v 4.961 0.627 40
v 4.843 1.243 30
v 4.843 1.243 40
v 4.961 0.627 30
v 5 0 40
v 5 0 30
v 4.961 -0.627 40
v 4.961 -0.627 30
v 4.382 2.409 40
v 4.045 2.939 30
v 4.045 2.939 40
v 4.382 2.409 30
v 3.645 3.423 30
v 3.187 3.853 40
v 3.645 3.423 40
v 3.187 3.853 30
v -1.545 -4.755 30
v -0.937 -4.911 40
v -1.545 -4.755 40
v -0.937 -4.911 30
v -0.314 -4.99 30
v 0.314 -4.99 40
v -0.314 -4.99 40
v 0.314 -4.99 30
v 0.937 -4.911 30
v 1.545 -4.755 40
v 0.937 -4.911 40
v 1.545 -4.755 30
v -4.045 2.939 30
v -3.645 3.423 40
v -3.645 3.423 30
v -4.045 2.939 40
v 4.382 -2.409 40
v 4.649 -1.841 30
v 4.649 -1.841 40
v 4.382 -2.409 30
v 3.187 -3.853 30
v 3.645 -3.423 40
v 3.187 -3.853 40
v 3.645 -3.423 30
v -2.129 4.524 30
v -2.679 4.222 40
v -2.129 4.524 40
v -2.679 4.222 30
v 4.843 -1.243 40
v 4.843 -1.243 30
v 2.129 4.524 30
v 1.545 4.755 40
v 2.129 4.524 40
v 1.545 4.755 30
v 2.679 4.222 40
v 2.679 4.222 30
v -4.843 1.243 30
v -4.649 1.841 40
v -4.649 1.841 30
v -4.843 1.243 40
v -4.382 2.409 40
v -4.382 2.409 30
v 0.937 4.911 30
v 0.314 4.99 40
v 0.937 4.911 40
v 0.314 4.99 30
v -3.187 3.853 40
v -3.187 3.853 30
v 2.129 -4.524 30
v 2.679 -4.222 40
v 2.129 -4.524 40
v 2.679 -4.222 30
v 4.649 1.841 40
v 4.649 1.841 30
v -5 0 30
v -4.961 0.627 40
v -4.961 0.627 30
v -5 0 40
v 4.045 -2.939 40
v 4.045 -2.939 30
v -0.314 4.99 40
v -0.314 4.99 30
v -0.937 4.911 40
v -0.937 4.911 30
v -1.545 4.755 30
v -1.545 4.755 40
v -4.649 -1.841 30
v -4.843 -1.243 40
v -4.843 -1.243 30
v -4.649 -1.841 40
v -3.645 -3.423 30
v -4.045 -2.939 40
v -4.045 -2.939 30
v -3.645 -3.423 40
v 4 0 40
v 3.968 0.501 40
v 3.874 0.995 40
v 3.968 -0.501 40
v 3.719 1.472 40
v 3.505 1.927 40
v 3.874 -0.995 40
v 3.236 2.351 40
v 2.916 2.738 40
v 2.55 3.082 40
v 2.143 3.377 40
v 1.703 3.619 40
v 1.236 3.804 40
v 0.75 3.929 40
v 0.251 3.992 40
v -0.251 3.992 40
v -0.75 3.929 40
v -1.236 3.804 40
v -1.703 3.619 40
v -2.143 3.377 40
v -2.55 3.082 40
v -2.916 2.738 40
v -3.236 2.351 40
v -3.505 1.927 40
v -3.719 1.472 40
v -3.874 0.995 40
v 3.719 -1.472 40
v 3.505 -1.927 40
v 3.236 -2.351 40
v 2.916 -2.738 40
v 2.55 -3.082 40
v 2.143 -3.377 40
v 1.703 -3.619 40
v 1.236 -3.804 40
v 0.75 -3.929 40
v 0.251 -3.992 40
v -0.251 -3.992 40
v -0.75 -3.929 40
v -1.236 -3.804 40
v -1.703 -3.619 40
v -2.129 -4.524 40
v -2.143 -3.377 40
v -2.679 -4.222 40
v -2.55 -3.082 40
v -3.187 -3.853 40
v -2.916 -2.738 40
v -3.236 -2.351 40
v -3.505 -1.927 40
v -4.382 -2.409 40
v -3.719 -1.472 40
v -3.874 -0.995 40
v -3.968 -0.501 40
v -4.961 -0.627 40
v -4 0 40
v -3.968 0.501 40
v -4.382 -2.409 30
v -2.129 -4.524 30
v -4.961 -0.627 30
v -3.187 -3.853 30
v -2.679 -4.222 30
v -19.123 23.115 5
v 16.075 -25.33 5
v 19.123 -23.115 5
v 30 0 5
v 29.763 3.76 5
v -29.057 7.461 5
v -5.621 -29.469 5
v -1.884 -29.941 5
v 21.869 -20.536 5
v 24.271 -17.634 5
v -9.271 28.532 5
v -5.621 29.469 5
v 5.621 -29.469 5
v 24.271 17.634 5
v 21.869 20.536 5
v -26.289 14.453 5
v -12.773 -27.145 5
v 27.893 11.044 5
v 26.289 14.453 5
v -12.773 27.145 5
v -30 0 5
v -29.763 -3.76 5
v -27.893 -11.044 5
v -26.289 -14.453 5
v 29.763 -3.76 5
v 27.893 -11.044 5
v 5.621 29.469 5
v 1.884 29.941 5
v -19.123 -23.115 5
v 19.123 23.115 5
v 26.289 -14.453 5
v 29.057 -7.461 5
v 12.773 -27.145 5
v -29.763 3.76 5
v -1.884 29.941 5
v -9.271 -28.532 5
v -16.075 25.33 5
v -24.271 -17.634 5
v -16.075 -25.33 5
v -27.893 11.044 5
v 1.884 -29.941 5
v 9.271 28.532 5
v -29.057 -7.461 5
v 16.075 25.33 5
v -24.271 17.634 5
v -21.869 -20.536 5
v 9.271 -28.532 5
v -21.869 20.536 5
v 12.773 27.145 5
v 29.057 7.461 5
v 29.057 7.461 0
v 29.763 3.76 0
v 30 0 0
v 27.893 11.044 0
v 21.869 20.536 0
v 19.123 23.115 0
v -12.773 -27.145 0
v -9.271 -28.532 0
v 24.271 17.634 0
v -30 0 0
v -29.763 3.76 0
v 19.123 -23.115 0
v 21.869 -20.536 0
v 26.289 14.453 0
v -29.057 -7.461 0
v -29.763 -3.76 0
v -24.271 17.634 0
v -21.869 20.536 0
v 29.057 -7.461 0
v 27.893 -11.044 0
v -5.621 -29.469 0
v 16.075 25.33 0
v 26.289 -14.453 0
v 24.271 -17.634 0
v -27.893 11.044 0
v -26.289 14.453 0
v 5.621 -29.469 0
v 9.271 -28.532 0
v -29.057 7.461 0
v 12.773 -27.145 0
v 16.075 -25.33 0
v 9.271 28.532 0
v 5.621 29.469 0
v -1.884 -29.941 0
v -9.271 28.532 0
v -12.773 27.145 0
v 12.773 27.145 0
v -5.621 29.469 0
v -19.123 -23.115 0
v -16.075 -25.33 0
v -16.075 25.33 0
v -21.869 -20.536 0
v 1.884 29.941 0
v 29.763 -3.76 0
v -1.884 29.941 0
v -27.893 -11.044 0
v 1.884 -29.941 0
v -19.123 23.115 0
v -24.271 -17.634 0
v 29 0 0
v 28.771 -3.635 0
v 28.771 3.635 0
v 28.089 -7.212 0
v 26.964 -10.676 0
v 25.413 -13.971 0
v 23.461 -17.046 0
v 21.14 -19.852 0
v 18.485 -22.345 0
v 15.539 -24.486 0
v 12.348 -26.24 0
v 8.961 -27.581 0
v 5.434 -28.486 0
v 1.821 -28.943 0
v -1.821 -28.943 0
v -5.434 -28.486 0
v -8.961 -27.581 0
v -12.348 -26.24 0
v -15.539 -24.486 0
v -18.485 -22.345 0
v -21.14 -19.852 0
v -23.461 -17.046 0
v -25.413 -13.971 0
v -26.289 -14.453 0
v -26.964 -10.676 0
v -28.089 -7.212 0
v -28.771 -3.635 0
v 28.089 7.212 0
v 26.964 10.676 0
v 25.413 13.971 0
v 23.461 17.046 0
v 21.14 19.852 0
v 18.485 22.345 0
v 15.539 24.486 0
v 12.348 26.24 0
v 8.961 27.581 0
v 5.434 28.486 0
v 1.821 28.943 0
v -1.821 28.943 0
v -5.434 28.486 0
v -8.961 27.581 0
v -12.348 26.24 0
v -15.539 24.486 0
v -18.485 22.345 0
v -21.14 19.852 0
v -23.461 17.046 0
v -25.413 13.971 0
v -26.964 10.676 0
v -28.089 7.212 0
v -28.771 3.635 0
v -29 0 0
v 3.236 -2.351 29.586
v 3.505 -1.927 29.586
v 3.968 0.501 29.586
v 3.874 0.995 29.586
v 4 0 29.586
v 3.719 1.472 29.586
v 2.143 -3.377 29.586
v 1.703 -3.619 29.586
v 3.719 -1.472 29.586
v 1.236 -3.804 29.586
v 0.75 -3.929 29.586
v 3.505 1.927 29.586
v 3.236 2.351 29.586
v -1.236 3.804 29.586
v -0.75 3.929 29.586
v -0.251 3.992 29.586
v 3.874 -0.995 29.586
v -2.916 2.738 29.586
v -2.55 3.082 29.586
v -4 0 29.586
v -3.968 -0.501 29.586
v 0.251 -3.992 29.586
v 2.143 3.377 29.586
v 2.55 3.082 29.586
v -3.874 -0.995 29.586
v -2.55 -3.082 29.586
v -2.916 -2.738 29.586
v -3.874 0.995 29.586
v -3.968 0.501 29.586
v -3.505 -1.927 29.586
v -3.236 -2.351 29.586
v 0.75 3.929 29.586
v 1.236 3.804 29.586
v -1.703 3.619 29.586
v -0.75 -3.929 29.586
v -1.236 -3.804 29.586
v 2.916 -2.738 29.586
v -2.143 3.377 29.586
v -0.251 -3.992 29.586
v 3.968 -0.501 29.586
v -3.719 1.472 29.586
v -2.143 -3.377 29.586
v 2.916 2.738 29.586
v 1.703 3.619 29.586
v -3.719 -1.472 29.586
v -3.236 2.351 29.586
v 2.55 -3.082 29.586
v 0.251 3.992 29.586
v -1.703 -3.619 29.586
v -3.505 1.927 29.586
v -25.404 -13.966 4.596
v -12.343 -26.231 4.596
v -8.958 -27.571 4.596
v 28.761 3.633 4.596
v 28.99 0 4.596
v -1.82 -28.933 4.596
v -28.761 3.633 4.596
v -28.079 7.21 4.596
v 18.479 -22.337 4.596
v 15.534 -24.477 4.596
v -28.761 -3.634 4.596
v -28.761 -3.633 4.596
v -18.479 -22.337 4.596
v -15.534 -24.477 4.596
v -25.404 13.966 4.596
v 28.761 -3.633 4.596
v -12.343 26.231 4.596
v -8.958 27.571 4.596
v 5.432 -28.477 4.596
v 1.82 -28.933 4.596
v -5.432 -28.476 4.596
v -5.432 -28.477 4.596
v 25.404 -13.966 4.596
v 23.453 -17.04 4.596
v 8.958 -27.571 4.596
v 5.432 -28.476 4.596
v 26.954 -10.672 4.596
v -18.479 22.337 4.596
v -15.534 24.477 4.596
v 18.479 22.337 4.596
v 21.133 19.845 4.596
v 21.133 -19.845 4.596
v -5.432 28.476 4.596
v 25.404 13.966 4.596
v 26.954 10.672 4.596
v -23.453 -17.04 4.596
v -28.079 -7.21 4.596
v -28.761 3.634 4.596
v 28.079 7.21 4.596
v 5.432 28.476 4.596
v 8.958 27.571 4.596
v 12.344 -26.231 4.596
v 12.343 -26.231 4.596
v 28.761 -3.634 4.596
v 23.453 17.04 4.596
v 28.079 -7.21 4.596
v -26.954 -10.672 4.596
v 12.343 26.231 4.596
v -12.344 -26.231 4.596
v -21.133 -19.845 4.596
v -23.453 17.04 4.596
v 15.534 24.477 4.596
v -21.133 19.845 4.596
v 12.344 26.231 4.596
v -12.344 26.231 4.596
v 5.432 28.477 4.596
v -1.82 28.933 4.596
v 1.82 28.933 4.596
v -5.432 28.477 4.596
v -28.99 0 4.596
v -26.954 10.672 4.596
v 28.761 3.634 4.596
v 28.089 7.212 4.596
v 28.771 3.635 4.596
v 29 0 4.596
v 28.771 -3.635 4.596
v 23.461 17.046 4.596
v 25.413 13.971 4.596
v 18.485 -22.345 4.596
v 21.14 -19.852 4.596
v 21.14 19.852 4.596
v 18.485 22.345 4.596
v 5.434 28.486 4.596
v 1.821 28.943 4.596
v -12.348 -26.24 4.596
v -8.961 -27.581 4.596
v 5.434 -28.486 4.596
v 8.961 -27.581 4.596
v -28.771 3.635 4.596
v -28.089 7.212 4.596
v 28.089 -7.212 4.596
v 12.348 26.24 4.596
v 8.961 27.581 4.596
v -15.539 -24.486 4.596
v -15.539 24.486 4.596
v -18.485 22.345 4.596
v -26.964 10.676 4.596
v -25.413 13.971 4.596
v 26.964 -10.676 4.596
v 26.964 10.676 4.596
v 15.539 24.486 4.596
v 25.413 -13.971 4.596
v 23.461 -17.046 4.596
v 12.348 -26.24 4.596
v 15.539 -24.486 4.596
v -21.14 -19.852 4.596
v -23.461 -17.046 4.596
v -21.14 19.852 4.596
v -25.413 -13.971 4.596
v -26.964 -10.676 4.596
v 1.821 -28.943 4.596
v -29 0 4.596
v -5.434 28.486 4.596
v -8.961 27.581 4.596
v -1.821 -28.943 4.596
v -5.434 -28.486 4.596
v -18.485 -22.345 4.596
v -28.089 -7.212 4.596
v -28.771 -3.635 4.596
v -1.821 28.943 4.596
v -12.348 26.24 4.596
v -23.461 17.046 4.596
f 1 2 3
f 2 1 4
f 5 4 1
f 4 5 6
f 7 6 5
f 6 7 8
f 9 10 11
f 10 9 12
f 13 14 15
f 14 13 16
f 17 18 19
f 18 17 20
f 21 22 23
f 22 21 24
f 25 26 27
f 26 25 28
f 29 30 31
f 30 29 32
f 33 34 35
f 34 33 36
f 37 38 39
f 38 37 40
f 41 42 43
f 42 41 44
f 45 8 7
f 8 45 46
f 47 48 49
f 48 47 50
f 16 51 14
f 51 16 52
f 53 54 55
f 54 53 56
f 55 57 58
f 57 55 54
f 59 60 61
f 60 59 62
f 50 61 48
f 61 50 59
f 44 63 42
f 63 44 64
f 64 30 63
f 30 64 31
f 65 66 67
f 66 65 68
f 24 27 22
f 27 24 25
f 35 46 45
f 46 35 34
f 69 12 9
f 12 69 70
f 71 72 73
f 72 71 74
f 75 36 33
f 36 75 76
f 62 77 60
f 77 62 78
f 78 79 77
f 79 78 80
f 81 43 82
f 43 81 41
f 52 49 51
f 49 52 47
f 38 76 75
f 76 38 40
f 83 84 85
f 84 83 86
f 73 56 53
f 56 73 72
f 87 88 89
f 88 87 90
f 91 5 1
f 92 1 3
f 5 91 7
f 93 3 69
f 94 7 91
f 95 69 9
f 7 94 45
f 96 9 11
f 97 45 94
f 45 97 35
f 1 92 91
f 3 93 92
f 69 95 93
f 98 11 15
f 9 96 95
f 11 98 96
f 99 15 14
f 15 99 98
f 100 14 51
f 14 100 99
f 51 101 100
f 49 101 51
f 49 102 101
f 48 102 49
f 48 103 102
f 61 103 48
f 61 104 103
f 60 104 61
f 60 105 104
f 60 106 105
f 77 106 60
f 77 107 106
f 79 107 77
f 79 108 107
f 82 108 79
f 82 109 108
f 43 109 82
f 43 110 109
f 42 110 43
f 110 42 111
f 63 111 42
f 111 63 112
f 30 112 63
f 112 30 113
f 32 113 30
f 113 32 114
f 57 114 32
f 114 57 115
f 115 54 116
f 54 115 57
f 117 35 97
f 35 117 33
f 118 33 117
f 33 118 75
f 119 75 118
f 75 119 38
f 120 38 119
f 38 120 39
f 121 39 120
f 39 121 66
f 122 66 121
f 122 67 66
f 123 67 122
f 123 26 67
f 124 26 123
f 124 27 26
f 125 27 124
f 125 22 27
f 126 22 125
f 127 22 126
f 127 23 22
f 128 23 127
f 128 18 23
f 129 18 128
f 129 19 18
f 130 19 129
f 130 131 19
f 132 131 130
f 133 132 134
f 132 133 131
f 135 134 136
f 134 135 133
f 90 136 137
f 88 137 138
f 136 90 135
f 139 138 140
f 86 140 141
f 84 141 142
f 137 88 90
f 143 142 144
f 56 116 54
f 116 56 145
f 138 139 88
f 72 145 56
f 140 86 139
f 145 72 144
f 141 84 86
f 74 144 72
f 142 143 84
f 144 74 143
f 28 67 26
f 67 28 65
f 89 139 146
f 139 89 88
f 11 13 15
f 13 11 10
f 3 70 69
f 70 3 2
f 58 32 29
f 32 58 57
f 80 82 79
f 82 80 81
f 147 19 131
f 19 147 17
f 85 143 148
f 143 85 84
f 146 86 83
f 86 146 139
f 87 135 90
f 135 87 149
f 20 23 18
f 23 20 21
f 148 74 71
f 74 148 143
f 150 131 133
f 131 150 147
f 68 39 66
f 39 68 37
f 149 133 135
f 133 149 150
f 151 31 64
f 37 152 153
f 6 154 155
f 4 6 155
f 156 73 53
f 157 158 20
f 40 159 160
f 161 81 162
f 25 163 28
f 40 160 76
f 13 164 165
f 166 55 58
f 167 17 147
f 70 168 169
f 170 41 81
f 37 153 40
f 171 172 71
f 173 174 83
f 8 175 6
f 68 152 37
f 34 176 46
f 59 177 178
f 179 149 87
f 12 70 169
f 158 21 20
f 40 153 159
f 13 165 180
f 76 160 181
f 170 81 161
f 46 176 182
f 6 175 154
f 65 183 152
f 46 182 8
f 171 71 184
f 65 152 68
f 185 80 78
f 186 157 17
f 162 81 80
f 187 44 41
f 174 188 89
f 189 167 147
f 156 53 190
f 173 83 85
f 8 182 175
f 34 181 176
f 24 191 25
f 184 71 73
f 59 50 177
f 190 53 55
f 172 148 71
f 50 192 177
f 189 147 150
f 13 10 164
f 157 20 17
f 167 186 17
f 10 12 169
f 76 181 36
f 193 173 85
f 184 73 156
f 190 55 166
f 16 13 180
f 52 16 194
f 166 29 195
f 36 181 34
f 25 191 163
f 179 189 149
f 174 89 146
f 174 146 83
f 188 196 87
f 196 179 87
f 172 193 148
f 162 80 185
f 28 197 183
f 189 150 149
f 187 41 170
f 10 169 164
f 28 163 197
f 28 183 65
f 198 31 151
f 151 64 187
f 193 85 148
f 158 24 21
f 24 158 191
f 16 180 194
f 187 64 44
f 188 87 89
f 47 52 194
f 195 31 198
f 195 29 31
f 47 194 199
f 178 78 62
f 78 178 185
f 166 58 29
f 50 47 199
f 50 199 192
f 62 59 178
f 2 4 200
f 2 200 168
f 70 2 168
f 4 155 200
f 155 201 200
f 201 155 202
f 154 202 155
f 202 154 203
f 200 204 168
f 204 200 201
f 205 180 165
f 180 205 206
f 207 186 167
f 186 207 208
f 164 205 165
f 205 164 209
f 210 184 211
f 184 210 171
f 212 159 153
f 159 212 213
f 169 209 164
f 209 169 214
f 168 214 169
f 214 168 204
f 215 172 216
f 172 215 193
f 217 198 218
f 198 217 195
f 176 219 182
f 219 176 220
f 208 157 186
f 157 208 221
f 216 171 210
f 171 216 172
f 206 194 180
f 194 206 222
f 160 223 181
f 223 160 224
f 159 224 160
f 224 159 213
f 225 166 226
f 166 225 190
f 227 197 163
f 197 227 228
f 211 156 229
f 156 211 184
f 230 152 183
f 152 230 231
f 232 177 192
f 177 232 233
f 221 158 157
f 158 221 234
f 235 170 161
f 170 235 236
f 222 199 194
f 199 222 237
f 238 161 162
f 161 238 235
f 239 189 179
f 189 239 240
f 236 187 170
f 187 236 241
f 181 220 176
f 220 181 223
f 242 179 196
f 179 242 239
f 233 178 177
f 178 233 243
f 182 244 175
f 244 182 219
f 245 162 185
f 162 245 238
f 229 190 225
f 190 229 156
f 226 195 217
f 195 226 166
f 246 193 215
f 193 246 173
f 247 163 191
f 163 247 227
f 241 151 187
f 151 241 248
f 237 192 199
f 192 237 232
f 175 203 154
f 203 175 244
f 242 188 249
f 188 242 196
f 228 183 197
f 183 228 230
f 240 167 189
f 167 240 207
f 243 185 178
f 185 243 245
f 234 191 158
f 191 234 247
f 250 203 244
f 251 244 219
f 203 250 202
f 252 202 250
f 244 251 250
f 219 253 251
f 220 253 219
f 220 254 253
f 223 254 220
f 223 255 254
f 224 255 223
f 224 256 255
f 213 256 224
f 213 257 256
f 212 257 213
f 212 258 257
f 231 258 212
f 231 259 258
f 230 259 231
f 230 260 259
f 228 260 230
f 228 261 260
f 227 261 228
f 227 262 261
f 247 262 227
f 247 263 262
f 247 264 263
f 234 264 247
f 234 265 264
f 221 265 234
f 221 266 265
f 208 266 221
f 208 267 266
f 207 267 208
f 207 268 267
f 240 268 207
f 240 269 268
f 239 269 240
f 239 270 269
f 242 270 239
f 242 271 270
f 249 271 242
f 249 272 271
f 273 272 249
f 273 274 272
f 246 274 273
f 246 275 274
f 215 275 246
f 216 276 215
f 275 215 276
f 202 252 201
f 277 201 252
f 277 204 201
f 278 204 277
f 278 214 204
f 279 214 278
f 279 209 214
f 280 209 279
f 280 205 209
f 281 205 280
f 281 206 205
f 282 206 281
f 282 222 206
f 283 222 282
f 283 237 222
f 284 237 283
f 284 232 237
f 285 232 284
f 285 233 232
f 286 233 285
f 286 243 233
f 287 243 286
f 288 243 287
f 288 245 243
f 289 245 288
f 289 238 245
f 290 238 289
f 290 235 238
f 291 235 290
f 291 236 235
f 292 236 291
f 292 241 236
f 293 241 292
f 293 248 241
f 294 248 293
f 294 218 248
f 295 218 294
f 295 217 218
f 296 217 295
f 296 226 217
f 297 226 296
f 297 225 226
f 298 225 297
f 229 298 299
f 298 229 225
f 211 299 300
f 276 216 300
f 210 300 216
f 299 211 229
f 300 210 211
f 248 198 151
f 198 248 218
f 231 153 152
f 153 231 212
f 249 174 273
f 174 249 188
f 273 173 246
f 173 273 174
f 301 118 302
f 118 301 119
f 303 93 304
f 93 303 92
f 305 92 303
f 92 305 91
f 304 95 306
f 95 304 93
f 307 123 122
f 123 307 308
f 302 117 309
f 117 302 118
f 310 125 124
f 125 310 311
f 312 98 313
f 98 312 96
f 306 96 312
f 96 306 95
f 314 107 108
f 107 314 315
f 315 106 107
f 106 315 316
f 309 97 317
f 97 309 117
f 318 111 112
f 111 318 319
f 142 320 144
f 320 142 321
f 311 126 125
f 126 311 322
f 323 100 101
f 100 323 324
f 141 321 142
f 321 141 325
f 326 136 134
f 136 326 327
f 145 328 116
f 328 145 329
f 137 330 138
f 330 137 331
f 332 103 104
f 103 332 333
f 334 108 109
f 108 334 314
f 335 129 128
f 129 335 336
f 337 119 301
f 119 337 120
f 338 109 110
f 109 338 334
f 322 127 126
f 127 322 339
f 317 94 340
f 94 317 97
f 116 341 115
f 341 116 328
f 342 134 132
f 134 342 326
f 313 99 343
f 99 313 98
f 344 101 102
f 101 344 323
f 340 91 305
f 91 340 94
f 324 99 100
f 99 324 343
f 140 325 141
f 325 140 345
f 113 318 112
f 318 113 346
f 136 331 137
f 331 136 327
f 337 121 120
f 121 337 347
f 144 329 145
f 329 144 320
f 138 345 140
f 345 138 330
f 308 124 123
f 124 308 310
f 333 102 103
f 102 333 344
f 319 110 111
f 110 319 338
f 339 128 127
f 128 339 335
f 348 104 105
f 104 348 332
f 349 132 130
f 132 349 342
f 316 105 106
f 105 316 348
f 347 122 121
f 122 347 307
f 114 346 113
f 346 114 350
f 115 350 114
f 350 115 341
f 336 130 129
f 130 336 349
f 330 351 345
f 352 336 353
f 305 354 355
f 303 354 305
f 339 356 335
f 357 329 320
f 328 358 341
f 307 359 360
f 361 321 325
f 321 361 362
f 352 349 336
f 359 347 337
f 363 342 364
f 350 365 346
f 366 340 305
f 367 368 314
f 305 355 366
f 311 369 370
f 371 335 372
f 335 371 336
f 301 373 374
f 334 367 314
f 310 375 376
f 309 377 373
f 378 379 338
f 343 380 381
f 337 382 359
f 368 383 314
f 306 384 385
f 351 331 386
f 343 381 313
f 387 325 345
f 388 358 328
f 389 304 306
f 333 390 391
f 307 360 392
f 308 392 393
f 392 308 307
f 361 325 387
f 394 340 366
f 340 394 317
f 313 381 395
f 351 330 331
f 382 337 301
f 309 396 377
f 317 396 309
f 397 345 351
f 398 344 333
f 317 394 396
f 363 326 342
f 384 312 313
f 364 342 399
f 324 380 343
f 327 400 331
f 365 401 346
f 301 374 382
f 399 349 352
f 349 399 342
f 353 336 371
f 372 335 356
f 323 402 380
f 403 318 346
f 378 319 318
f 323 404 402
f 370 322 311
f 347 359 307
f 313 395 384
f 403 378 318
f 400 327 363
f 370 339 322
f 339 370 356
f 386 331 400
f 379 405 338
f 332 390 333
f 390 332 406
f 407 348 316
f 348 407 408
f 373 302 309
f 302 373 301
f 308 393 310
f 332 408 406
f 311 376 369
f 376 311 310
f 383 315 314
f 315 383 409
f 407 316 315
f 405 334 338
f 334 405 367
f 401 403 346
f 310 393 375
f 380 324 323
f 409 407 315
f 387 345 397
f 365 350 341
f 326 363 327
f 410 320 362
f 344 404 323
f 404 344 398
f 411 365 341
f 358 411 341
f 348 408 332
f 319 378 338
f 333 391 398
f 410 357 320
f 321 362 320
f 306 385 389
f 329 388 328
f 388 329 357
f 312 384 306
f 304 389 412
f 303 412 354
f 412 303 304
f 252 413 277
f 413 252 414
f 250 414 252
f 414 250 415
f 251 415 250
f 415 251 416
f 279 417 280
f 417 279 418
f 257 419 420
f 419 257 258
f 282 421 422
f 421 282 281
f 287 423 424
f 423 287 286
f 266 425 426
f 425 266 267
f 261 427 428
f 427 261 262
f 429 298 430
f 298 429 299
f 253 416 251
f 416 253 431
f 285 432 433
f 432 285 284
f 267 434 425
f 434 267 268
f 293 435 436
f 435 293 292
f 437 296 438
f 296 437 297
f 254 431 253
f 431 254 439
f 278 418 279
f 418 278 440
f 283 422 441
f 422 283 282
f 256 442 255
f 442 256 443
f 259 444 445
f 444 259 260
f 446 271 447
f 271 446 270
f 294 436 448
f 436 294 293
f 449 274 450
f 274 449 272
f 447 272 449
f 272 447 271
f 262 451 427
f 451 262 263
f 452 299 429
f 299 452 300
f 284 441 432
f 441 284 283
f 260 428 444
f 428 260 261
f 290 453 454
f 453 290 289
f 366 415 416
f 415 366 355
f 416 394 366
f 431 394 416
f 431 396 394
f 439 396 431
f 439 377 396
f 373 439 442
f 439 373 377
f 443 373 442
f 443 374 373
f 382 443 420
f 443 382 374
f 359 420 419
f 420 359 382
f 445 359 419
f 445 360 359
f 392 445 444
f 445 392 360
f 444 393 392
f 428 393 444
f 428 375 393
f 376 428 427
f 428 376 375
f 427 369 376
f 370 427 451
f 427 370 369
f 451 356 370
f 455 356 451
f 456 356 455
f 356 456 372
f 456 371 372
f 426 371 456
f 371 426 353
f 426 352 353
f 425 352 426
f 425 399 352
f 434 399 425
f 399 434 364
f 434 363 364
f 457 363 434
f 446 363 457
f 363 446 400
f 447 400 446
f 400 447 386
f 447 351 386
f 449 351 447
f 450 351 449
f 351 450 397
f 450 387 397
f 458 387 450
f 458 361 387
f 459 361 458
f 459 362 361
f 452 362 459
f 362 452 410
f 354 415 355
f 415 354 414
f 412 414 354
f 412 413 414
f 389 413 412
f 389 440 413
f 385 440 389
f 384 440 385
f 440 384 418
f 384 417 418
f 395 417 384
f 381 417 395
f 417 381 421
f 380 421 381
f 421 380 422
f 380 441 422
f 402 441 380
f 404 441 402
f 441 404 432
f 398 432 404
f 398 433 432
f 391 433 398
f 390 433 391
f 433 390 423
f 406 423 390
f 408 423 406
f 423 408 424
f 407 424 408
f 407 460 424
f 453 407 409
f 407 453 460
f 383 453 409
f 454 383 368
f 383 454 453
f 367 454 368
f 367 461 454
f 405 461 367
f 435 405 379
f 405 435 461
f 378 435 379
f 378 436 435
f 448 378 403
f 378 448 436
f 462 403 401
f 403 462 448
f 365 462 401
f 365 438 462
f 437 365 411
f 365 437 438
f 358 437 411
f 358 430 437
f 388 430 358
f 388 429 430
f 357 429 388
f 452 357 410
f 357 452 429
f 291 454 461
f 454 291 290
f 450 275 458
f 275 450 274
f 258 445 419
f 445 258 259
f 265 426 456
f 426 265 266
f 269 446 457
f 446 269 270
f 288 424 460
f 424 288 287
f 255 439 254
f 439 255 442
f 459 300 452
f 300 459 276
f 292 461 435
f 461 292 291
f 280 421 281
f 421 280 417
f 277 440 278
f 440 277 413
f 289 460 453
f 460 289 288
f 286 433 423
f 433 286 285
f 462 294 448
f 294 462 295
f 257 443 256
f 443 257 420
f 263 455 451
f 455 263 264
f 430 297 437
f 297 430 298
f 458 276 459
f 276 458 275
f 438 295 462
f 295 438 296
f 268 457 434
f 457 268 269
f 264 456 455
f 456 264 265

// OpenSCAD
// [FL_INDEX: keywords="openscad, 3d_parametric, Customizable_Funnel, csg_solid" | COT="Parametric OpenSCAD design from 3DCodeverse"]
// Title: Customizable Funnel

// preview[view:south, tilt:top diagonal]

//*********Declaration of customization variables************

//What outer diameter should the large opening have?
Large_End_Diameter = 60;

//What outer diameter should the small opening have?
Small_End_Diameter = 10;

//How thick should the walls be?
Wall_Thickness = 1; // [1:5]

//What's the overall height of the funnel?
Funnel_Height = 40;

//How tall should the band on the top be before the funnel begins?
Top_Band = 5;

//How long should the spout on the bottom be after the funnel ends?
Bottom_Spout_Length = 10;

//**********Assignment of customization vars to original scad vars***

spout_or = Small_End_Diameter/2;  //outer radius of bottom opening / spout
wall = Wall_Thickness; //wall thickness
flare_percentage = Large_End_Diameter / Small_End_Diameter * 100; // ratio of funnel opening (top) to spout (bottom), expressed as percentage
height = Funnel_Height; //total height
bottom_band=Bottom_Spout_Length;

res = 100/2; //resolution for cylinders
plane = 0.01/1;

//**********calculated variables*******************

spout_ir = spout_or - wall;
top_or = spout_or*flare_percentage/100;
top_ir = top_or - wall;

h1 = bottom_band;
h2 = height - Top_Band;
funnel_rise = height - bottom_band - Top_Band;
hi_adjust_ang = atan((top_or-spout_or)/funnel_rise)/2;
hi_adjust = wall*tan(hi_adjust_ang);

//**********begin build****************************

translate([0,0,height])mirror([0,0,1])difference(){

//**********outer shape****************************

union(){

cylinder(h=bottom_band,r=spout_or,$fn=res);
translate([0,0,h1])cylinder(h=funnel_rise,r1=spout_or,r2=top_or,$fn=res);
translate([0,0,h2])cylinder(h=Top_Band,r=top_or,$fn=res);

}

//**********inner shape****************************

union(){

cylinder(h=bottom_band+plane+hi_adjust,r=spout_ir,$fn=res);
translate([0,0,h1+hi_adjust])cylinder(h=funnel_rise,r1=spout_ir,r2=top_ir,$fn=res);
translate([0,0,h2+hi_adjust-plane])cylinder(h=Top_Band+hi_adjust+plane,r=top_ir,$fn=res);

//cube([top_or+1,top_or+1,height+1]); //cut for inspection of inner geometry

}

}
